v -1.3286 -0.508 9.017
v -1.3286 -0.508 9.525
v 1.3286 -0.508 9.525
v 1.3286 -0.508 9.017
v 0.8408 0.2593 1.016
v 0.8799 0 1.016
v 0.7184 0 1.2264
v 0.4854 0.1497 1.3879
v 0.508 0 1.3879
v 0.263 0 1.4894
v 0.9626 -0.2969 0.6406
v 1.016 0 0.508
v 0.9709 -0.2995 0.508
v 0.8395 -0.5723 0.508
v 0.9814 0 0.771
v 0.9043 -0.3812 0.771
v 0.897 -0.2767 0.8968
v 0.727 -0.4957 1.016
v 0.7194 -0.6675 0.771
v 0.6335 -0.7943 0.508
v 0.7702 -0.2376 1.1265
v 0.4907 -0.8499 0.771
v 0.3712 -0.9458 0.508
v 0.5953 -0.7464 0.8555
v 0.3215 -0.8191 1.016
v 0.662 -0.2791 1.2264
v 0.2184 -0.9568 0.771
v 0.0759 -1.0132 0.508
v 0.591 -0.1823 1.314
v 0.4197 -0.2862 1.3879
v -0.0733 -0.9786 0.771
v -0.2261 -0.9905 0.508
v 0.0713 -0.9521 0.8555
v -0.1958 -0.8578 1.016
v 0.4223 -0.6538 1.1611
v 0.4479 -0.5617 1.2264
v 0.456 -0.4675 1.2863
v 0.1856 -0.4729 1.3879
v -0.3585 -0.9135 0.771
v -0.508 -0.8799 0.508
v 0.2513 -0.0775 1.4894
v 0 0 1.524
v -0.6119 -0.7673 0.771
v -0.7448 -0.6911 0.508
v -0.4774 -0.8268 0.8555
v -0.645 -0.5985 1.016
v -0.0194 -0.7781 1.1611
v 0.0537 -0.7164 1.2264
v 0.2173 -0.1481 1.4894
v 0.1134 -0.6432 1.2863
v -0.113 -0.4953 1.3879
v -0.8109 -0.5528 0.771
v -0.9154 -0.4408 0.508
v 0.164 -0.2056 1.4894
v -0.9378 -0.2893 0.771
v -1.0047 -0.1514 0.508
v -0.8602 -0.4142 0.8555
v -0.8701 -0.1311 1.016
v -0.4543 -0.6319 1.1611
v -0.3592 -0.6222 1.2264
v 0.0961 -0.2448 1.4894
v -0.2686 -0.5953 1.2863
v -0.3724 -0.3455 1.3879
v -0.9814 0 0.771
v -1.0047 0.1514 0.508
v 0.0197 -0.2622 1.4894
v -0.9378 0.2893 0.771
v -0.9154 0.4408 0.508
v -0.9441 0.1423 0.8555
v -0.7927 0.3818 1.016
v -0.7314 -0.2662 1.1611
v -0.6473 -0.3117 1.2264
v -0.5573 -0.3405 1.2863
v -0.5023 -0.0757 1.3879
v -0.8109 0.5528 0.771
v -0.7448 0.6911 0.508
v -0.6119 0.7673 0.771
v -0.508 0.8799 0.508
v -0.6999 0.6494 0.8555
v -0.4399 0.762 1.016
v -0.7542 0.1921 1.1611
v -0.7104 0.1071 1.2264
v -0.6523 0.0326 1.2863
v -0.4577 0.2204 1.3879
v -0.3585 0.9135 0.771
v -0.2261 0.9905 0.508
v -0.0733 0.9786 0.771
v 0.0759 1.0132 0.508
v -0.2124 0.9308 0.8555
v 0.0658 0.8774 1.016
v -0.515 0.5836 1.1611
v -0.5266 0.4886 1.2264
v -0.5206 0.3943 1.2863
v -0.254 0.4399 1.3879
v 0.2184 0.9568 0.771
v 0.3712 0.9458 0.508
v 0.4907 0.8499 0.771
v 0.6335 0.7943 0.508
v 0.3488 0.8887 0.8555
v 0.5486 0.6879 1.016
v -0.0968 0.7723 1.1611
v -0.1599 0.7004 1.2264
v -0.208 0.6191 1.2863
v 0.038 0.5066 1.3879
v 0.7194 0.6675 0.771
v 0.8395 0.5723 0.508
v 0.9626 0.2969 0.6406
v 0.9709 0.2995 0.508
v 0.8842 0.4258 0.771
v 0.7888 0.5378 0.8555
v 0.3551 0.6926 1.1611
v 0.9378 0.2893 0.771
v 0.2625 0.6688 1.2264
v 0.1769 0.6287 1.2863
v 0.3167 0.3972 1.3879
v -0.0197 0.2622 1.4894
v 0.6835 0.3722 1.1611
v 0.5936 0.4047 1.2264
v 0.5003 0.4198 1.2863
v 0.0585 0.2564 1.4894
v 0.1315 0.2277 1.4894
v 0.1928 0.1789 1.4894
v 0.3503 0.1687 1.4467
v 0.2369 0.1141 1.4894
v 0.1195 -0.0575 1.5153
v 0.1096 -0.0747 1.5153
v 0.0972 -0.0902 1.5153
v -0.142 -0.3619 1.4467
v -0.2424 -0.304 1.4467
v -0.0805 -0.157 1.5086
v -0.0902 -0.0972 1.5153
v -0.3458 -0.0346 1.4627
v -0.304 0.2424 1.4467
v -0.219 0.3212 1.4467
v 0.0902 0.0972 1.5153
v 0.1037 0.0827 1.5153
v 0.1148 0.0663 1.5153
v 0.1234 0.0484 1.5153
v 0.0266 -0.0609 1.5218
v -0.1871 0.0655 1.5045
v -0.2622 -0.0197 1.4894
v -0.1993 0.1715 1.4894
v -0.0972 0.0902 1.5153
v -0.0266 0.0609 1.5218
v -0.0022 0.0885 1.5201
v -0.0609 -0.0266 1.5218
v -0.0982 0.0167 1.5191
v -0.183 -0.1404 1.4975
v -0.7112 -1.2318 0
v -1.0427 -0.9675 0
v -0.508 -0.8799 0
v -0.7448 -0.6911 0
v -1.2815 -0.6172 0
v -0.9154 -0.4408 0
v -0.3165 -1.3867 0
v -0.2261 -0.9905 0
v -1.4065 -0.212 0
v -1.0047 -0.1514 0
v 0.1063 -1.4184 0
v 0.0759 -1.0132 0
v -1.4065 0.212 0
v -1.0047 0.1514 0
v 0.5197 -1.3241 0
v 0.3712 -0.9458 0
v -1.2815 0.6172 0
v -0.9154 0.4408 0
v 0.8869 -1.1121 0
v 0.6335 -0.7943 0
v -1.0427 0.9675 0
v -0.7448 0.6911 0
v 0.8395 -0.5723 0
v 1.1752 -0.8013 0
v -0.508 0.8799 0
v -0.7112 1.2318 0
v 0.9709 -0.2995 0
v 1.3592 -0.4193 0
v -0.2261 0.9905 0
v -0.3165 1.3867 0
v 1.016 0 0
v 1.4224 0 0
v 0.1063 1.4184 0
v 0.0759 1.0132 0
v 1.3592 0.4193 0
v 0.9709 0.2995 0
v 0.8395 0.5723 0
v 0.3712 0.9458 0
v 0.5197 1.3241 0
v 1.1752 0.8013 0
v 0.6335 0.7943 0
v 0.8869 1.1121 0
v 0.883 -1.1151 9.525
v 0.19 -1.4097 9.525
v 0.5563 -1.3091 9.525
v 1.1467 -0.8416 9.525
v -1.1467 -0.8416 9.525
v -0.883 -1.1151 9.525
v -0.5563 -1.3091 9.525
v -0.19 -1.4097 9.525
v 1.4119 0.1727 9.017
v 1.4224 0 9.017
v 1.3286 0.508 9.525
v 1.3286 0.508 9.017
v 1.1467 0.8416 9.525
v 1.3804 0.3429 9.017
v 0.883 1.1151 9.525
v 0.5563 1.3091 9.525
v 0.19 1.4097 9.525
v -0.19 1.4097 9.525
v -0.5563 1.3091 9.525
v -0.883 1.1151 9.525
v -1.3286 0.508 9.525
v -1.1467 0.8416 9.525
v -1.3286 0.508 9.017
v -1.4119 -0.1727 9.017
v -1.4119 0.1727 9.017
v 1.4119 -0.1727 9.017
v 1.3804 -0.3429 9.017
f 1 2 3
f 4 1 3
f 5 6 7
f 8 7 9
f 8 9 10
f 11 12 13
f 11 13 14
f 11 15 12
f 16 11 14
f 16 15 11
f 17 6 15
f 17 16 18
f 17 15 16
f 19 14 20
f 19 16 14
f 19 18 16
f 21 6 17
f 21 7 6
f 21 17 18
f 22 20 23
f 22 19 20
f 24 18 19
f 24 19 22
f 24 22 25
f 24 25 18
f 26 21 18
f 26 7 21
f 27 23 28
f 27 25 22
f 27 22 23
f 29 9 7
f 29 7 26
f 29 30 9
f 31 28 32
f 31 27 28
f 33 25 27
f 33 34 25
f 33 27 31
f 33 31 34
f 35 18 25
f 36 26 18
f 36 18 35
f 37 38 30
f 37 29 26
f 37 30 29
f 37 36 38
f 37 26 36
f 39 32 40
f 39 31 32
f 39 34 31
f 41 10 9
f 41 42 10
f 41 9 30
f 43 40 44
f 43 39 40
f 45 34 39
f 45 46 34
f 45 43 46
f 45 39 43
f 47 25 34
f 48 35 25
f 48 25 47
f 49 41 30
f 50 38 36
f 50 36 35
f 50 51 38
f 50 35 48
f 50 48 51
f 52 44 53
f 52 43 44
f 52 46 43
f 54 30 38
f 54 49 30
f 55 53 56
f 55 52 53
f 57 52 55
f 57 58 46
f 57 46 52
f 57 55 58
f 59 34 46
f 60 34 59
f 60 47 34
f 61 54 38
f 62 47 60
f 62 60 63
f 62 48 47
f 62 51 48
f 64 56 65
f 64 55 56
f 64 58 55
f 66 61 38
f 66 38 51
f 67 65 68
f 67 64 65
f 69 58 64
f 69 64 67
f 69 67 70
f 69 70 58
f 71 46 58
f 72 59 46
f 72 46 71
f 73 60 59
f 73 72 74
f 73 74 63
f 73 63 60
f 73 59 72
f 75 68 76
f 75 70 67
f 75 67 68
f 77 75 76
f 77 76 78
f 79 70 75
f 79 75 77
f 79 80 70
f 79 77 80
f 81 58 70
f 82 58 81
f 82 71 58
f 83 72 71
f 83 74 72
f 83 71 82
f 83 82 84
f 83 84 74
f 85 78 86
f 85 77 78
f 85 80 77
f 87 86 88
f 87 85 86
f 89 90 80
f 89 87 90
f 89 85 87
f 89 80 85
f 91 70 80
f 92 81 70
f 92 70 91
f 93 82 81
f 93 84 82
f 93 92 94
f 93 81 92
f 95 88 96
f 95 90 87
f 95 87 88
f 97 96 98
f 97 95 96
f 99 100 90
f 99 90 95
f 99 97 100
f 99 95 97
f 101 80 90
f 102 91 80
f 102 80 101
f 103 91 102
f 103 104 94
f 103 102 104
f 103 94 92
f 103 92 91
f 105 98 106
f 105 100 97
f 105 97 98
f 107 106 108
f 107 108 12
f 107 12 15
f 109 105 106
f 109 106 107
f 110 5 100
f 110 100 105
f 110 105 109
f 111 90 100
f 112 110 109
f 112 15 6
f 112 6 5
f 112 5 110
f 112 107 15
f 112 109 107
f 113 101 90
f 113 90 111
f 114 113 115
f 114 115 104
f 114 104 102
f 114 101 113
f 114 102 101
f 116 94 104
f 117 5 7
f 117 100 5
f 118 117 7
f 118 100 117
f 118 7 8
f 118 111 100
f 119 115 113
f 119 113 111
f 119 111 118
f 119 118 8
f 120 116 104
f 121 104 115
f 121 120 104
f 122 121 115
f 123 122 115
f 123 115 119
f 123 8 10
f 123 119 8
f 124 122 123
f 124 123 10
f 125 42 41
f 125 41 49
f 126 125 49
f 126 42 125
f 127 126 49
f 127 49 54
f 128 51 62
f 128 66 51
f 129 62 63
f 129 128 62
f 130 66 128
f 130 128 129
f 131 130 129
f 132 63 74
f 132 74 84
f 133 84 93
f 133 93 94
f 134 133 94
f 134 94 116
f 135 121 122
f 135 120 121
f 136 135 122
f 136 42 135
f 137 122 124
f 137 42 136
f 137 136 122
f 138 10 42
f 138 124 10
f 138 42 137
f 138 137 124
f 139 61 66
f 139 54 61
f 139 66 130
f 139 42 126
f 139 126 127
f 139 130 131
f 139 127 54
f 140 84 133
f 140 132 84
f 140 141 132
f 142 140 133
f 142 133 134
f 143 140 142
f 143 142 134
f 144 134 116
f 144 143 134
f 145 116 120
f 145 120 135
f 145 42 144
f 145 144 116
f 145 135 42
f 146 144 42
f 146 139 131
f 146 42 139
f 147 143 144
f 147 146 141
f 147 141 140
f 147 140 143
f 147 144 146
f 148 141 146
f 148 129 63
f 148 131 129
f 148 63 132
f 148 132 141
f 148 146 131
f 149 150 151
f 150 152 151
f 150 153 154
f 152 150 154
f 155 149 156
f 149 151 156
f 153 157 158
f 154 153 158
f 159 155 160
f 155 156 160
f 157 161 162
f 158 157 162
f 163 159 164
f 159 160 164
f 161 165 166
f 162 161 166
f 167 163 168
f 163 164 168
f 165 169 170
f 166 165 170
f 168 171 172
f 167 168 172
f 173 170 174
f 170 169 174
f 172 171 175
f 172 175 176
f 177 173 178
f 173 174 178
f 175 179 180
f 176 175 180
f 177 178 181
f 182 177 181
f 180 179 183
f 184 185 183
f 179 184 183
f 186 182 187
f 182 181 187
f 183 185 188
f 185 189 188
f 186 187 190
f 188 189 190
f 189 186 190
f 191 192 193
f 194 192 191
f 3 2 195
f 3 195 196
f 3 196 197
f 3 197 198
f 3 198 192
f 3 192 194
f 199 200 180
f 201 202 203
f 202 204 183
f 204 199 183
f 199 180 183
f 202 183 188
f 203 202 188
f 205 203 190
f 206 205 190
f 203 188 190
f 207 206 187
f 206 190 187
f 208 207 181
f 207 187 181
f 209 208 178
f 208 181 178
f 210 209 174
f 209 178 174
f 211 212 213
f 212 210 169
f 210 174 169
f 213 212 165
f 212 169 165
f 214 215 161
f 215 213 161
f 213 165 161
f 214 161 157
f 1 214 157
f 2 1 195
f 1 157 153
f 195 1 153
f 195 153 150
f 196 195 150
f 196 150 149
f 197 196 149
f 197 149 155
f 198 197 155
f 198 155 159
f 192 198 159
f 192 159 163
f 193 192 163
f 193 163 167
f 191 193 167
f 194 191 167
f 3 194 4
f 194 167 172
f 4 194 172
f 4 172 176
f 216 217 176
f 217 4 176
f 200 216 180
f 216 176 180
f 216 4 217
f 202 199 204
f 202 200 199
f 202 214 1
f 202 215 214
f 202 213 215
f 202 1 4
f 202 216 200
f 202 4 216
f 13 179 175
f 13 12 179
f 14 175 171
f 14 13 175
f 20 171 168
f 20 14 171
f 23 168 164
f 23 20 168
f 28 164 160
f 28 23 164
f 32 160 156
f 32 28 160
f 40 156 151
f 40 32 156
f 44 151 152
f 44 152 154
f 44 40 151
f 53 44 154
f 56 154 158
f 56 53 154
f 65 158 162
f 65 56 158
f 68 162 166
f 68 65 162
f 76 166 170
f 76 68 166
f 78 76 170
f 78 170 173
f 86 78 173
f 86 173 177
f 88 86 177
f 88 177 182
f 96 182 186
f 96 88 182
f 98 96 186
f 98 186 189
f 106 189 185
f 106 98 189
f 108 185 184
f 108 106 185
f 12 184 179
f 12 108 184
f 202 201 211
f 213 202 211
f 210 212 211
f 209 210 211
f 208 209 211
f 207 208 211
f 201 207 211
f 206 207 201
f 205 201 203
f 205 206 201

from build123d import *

# Parameters (mm, degrees)
F0_R     = 1.4224
F1_DEPTH = 9.525
F5_DEPTH = 0.508


with BuildPart() as f1:
    # F0 (on Top) → F1 (new body)
    with BuildSketch(Plane.XY):
        Circle(F0_R)
    extrude(amount=F1_DEPTH)

    # F2 (on Front) → F3 (revolve, cut)
    with BuildSketch(Plane.XZ):
        with BuildLine():
            Line((0, 1.524), (0, 0))
            Line((0, 0), (1.016, 0))
            Line((1.016, 0), (1.016, 0.508))
            ThreePointArc((1.016, 0.508), (0.71842, 1.22642), (0, 1.524))
        make_face()
    revolve(axis=Axis((0, 0, 0), (0, 0, -1)), mode=Mode.SUBTRACT)

    # F4 (on face) → F5 (cut)
    with BuildSketch(Plane.XY.offset(9.525)):
        Polygon((1.963537, 0.508), (0, 0.508), (-1.963537, 0.508), (-1.963537, -0.508), (0, -0.508), (1.963537, -0.508), align=None)
    extrude(amount=-F5_DEPTH, mode=Mode.SUBTRACT)


solid = f1.part
